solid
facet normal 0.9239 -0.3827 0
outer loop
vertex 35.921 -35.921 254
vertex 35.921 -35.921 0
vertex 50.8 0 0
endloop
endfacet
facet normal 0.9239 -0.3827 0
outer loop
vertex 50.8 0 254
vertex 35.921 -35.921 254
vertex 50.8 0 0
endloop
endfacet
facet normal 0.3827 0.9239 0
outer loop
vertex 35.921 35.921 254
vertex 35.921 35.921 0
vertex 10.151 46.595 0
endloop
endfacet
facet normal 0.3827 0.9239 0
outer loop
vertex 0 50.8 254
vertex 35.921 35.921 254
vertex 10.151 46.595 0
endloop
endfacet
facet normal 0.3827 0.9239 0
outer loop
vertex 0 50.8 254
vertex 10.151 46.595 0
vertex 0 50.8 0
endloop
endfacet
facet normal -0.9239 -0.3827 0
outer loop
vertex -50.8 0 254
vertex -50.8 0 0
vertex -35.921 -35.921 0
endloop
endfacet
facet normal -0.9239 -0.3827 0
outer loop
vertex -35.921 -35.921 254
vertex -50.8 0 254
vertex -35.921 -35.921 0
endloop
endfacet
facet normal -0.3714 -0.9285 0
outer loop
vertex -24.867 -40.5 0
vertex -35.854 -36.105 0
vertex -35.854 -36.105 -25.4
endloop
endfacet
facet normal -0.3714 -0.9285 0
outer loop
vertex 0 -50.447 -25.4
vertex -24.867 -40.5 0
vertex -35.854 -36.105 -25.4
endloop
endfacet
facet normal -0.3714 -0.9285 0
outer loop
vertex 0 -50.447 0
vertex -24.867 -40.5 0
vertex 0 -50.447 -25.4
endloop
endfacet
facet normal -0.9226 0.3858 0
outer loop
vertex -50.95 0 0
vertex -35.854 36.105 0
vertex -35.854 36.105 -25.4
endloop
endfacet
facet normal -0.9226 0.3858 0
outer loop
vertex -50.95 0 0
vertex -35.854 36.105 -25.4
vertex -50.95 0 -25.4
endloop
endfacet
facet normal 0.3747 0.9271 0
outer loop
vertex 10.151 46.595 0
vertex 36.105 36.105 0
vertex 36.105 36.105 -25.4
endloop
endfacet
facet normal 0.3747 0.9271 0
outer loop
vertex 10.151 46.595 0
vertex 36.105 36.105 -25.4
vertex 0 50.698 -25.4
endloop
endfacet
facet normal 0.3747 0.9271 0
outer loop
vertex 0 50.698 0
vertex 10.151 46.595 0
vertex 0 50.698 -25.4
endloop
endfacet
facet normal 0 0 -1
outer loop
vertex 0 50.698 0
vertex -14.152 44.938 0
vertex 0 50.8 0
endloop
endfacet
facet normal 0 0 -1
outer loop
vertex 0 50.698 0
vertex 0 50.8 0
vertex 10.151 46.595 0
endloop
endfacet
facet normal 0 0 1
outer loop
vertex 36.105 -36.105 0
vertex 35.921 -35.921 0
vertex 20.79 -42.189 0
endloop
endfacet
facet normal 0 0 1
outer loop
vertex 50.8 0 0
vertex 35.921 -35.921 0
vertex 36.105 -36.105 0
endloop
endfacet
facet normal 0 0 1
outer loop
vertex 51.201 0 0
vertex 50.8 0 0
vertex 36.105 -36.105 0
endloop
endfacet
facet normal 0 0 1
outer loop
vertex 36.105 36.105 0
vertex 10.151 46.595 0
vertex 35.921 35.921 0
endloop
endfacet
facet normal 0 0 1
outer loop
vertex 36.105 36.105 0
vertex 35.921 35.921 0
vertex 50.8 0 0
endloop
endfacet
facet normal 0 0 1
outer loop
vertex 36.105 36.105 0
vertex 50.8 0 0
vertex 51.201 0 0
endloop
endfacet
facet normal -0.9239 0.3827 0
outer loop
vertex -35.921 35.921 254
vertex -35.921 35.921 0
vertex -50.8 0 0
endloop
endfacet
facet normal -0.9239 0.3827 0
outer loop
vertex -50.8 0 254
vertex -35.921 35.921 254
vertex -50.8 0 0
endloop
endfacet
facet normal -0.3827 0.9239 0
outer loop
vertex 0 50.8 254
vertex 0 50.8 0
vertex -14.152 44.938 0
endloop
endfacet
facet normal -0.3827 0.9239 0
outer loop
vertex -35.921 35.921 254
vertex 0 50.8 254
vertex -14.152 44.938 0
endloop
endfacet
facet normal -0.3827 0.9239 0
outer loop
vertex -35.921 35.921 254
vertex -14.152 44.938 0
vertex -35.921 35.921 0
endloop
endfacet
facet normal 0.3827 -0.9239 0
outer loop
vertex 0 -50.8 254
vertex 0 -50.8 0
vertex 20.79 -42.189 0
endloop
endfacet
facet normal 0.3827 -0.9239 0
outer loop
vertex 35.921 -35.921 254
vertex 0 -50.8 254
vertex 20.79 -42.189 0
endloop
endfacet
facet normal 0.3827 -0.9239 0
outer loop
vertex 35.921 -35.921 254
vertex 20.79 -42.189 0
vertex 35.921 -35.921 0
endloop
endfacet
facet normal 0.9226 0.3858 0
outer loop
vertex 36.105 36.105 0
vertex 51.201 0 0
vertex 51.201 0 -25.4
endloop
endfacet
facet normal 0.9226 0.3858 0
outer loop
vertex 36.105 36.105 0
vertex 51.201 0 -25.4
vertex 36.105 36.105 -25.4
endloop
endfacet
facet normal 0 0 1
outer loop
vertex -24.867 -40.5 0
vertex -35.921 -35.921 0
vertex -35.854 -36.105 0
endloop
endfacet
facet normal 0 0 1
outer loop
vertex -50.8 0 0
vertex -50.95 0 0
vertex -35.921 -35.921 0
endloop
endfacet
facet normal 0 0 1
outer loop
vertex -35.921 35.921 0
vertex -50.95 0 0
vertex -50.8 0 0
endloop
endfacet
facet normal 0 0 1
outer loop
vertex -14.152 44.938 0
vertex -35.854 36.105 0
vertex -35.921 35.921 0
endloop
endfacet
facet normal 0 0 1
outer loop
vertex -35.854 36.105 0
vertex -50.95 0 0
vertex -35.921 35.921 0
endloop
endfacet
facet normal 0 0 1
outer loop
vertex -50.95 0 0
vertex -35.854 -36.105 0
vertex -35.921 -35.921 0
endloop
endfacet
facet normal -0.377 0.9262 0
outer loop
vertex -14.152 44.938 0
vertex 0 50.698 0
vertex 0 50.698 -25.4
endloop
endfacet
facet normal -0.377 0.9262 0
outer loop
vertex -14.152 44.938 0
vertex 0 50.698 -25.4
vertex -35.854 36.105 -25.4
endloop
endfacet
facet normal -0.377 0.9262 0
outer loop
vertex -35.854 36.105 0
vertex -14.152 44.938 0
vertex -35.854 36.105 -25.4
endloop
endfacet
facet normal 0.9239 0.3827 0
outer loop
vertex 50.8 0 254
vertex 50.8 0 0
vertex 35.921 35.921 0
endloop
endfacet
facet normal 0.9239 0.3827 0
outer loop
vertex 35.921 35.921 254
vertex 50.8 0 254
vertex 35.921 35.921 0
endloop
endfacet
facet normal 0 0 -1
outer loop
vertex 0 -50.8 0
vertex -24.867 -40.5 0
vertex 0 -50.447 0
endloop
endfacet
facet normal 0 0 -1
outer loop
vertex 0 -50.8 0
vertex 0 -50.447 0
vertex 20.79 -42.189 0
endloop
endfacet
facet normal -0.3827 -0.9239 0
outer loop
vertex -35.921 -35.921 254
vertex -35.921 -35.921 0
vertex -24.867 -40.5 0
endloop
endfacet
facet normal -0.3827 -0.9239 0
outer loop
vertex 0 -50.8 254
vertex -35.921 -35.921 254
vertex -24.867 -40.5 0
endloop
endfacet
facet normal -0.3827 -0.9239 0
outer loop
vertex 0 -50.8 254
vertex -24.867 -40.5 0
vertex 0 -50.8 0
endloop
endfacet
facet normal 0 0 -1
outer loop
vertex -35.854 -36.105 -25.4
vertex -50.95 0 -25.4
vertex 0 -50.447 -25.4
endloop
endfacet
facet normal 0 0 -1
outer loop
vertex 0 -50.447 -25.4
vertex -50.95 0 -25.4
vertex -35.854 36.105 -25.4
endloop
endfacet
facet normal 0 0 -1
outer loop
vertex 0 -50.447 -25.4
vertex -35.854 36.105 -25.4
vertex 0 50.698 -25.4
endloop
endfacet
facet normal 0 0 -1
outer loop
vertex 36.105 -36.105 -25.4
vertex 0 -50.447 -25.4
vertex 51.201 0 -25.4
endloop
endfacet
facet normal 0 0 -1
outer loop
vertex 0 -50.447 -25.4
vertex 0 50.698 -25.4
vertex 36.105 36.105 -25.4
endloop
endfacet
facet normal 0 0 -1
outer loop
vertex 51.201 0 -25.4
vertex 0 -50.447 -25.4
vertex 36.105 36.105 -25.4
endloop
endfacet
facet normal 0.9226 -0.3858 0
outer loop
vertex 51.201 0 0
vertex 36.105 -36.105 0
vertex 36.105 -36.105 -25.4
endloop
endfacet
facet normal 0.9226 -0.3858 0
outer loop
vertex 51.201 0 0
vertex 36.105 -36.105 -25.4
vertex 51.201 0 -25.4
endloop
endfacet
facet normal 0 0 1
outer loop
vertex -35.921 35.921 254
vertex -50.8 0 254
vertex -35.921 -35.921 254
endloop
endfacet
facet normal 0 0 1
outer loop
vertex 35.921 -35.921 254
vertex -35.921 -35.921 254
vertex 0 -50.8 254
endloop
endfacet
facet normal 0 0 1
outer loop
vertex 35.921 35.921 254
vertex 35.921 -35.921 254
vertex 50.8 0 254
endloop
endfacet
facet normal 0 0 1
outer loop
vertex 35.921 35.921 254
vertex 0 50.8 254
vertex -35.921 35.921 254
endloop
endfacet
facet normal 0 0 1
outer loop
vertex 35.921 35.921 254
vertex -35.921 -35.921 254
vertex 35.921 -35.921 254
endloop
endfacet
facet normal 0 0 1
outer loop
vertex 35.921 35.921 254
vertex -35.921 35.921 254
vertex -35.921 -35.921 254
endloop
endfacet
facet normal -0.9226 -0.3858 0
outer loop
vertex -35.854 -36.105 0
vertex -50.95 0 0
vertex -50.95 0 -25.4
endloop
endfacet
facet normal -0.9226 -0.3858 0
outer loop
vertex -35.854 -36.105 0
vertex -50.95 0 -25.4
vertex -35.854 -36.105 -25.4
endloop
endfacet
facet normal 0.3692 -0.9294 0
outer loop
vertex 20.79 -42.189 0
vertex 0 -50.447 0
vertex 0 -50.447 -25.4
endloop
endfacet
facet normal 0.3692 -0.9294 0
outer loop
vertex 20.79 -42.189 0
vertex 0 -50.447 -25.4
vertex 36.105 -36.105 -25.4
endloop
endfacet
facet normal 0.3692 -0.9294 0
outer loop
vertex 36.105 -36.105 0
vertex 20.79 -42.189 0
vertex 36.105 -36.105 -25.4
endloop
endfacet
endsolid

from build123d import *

# Parameters (mm, degrees)
F1_DEPTH = 254
F3_DEPTH = 25.4


with BuildPart() as f1:
    # F0 (on Top) → F1 (new body)
    with BuildSketch(Plane.XY):
        Polygon((35.921024, -35.921024), (50.8, 0), (35.921024, 35.921024), (0, 50.8), (-35.921024, 35.921024), (-50.8, 0), (-35.921024, -35.921024), (0, -50.8), align=None)
    extrude(amount=F1_DEPTH)

    # F2 (on Top) → F3 (join)
    with BuildSketch(Plane.XY):
        Polygon((-50.949764, 0), (-35.853539, -36.105141), (0, 0), align=None)
        Polygon((0, 0), (-35.853539, -36.105141), (0, -50.446555), align=None)
        Polygon((36.105141, -36.105141), (0, 0), (0, -50.446555), align=None)
        Polygon((-50.949764, 0), (0, 0), (-35.853539, 36.105141), align=None)
        Polygon((-35.853539, 36.105141), (0, 0), (0, 50.698161), align=None)
        Polygon((0, 50.698161), (0, 0), (36.105141, 36.105141), align=None)
        Polygon((51.201366, 0), (0, 0), (36.105141, -36.105141), align=None)
        Polygon((36.105141, 36.105141), (0, 0), (51.201366, 0), align=None)
    extrude(amount=-F3_DEPTH)


solid = f1.part
